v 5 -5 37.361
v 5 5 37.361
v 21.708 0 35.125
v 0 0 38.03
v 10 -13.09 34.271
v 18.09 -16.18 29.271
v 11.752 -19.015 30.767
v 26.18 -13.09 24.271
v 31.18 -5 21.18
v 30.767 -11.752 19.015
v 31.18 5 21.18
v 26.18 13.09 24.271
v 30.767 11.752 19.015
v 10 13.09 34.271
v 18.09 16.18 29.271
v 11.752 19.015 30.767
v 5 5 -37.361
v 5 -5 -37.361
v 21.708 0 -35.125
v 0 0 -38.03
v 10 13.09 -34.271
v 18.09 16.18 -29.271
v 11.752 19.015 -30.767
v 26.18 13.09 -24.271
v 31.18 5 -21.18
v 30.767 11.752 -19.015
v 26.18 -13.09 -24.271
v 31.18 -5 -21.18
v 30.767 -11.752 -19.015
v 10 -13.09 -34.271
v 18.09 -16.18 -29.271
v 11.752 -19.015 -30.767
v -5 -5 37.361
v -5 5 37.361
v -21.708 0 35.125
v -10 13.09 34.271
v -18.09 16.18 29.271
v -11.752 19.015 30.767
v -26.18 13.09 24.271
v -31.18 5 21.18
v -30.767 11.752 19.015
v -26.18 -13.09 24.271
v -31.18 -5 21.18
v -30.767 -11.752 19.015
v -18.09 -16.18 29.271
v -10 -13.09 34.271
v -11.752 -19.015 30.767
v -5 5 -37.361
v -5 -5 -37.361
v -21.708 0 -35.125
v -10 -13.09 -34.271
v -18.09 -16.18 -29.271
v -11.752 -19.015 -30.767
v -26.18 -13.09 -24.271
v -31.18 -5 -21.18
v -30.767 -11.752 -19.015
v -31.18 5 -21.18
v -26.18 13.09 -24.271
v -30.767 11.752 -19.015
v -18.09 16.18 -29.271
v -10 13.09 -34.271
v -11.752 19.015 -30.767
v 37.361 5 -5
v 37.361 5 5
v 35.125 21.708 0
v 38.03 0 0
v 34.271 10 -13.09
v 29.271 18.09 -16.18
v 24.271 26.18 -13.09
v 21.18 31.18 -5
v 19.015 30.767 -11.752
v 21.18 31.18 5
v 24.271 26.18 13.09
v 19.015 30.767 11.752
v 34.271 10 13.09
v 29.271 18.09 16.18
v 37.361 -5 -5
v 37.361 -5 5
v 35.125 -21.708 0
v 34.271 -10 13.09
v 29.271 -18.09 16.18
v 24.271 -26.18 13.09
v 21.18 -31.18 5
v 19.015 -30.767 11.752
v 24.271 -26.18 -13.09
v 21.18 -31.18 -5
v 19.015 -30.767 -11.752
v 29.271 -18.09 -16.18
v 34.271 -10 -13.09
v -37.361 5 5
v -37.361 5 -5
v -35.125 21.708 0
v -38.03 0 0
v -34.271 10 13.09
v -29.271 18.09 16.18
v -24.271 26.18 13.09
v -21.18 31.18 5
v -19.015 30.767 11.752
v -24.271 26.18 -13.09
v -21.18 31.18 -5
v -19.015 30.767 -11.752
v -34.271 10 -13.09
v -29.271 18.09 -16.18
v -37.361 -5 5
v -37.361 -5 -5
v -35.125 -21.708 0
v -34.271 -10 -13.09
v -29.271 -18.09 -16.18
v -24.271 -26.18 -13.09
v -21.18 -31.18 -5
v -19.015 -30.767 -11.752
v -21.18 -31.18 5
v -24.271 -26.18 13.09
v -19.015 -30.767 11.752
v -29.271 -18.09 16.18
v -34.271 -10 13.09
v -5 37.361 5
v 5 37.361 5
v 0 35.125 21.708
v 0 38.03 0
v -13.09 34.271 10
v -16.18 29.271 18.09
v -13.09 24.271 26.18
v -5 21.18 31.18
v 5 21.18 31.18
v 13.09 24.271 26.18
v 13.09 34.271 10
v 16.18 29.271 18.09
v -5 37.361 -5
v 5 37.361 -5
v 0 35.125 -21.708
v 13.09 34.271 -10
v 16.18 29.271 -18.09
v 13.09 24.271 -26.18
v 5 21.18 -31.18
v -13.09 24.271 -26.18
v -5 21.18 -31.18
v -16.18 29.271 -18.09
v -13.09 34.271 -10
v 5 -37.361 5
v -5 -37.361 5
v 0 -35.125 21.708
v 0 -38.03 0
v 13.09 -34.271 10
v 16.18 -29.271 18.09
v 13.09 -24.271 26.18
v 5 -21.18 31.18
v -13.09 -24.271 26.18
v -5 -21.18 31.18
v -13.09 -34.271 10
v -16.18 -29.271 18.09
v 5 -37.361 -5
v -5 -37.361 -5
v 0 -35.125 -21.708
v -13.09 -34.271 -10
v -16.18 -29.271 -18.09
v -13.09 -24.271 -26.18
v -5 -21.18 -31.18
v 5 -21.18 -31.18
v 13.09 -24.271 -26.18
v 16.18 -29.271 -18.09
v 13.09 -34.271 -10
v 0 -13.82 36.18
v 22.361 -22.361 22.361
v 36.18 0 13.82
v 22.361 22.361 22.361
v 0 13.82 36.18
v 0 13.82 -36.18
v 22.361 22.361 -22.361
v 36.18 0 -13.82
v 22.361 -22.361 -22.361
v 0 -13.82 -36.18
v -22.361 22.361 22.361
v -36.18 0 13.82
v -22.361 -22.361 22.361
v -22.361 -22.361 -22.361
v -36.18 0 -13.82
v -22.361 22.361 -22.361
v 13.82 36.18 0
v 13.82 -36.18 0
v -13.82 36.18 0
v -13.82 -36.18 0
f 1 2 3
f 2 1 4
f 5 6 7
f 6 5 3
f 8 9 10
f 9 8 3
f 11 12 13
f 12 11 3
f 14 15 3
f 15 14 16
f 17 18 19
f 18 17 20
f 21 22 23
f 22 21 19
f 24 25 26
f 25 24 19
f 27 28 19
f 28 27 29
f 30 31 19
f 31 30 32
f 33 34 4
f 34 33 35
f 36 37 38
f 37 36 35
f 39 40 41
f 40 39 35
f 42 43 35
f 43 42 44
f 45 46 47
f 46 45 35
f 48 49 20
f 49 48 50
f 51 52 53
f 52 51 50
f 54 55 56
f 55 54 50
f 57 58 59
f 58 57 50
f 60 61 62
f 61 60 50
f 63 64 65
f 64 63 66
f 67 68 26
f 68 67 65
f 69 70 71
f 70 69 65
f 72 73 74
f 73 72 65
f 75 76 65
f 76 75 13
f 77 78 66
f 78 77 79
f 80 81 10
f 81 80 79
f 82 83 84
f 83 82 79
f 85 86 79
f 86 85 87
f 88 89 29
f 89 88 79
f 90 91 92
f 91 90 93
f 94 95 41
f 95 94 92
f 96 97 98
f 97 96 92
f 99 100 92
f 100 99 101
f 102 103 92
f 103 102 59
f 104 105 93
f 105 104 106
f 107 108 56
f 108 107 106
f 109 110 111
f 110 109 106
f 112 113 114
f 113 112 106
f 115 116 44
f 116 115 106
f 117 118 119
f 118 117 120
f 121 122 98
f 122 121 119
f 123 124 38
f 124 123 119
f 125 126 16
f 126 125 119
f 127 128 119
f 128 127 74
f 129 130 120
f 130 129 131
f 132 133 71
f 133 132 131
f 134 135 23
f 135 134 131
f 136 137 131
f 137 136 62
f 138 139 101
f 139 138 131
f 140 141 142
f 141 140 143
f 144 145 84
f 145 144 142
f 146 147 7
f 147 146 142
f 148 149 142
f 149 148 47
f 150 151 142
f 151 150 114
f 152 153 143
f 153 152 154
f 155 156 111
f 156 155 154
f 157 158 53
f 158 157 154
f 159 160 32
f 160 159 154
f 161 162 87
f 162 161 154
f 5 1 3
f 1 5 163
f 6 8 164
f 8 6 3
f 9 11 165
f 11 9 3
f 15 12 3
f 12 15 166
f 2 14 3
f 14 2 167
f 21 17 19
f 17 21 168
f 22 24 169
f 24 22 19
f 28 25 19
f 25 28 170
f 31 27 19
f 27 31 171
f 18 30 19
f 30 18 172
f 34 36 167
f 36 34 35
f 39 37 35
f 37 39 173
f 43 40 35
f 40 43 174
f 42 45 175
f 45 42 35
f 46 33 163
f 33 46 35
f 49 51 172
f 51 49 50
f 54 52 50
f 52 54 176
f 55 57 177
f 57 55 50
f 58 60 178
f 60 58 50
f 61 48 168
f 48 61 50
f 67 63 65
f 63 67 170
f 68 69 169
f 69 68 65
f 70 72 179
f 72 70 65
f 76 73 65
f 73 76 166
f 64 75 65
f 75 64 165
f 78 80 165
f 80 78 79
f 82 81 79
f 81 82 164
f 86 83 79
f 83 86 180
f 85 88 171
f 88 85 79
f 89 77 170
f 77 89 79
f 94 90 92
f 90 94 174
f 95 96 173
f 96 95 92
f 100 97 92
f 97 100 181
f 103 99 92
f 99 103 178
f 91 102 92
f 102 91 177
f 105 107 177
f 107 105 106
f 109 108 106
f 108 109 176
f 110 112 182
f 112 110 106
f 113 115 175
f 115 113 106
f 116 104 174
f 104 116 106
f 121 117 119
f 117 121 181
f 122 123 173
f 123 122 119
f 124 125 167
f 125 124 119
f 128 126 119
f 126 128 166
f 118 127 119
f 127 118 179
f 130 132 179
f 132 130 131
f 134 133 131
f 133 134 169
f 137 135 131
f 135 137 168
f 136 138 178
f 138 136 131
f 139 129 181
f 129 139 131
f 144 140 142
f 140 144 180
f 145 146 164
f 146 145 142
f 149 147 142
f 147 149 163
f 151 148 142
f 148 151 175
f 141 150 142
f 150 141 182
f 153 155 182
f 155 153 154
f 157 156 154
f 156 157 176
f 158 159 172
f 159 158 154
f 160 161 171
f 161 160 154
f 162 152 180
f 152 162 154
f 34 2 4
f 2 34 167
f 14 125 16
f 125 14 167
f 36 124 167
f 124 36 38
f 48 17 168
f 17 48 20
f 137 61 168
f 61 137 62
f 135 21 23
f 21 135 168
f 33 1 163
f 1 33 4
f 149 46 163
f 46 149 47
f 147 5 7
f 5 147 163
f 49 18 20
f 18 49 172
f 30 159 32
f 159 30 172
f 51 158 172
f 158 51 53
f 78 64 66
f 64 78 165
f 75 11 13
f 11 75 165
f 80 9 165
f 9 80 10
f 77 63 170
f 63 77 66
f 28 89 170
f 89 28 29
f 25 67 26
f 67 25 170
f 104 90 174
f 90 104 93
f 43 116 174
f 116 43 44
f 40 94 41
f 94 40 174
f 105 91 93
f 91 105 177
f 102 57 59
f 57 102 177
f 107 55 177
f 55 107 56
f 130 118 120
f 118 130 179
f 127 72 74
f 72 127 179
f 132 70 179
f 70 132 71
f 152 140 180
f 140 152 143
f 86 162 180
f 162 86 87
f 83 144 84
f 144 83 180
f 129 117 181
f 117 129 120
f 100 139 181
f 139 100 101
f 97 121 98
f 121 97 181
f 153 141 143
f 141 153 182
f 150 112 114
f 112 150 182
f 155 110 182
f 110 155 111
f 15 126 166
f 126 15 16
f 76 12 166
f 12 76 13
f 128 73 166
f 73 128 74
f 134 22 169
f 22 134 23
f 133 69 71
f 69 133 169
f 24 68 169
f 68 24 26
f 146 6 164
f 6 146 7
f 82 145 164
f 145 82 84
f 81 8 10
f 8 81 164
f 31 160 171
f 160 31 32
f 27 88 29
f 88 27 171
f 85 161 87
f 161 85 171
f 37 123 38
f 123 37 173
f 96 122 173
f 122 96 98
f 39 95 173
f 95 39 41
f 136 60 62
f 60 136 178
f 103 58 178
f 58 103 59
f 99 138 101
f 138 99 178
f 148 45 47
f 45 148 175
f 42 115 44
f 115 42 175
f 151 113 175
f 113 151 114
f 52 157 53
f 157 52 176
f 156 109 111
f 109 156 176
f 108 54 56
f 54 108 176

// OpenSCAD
// Joined Truncated Icosidodecahedron
//   coords via: http://dmccooey.com/polyhedra/JoinedTruncatedIcosidodecahedron.html
//   180 sides
//   182 vertices
//   360 edges
//
scaling_factor = 10;

C0  = 3 * (15 +     sqrt(5)) / 44;
C1  =     ( 3 +     sqrt(5)) /  4;
C2  =     ( 5 -     sqrt(5)) /  2;
C3  =     ( 1 +     sqrt(5)) /  2;
C4  =     ( 5 +     sqrt(5)) /  4;
C5  = 3 * ( 5 + 4 * sqrt(5)) / 22;
C6  =     ( 2 +     sqrt(5)) /  2;
C7  = 3 * ( 5 +     sqrt(5)) / 10;
C8  =               sqrt(5);
C9  = 3 * ( 1 +     sqrt(5)) /  4;
C10 =     ( 3 +     sqrt(5)) /  2;
C11 =     ( 5 + 3 * sqrt(5)) /  4;
C12 = 3 * (25 + 9 * sqrt(5)) / 44;
C13 =     ( 4 +     sqrt(5)) /  2;
C14 =     ( 7 + 3 * sqrt(5)) /  4;
C15 = 3 * ( 5 + 3 * sqrt(5)) / 10;
C16 =     ( 5 +     sqrt(5)) /  2;
C17 =     ( 3 + 2 * sqrt(5)) /  2;
C18 = 3 * ( 5 + 4 * sqrt(5)) / 11;

vertices = [
 [ 0.0,  0.0,  C18], [ 0.0,  0.0, -C18],
 [ C18,  0.0,  0.0], [-C18,  0.0,  0.0],
 [ 0.0,  C18,  0.0], [ 0.0, -C18,  0.0],
 [ 0.5,  0.5,  C17], [ 0.5,  0.5, -C17], [ 0.5, -0.5,  C17], [ 0.5, -0.5, -C17],
 [-0.5,  0.5,  C17], [-0.5,  0.5, -C17], [-0.5, -0.5,  C17], [-0.5, -0.5, -C17],
 [ C17,  0.5,  0.5], [ C17,  0.5, -0.5], [ C17, -0.5,  0.5], [ C17, -0.5, -0.5],
 [-C17,  0.5,  0.5], [-C17,  0.5, -0.5], [-C17, -0.5,  0.5], [-C17, -0.5, -0.5],
 [ 0.5,  C17,  0.5], [ 0.5,  C17, -0.5], [ 0.5, -C17,  0.5], [ 0.5, -C17, -0.5],
 [-0.5,  C17,  0.5], [-0.5,  C17, -0.5], [-0.5, -C17,  0.5], [-0.5, -C17, -0.5],
 [ 0.0,   C2,  C16], [ 0.0,   C2, -C16], [ 0.0,  -C2,  C16], [ 0.0,  -C2, -C16],
 [ C16,  0.0,   C2], [ C16,  0.0,  -C2], [-C16,  0.0,   C2], [-C16,  0.0,  -C2],
 [  C2,  C16,  0.0], [  C2, -C16,  0.0], [ -C2,  C16,  0.0], [ -C2, -C16,  0.0],
 [  C7,  0.0,  C15], [  C7,  0.0, -C15], [ -C7,  0.0,  C15], [ -C7,  0.0, -C15],
 [ C15,   C7,  0.0], [ C15,  -C7,  0.0], [-C15,   C7,  0.0], [-C15,  -C7,  0.0],
 [ 0.0,  C15,   C7], [ 0.0,  C15,  -C7], [ 0.0, -C15,   C7], [ 0.0, -C15,  -C7],
 [ 1.0,   C1,  C14], [ 1.0,   C1, -C14], [ 1.0,  -C1,  C14], [ 1.0,  -C1, -C14],
 [-1.0,   C1,  C14], [-1.0,   C1, -C14], [-1.0,  -C1,  C14], [-1.0,  -C1, -C14],
 [ C14,  1.0,   C1], [ C14,  1.0,  -C1], [ C14, -1.0,   C1], [ C14, -1.0,  -C1],
 [-C14,  1.0,   C1], [-C14,  1.0,  -C1], [-C14, -1.0,   C1], [-C14, -1.0,  -C1],
 [  C1,  C14,  1.0], [  C1,  C14, -1.0], [  C1, -C14,  1.0], [  C1, -C14, -1.0],
 [ -C1,  C14,  1.0], [ -C1,  C14, -1.0], [ -C1, -C14,  1.0], [ -C1, -C14, -1.0],
 [ 0.5,   C6,  C13], [ 0.5,   C6, -C13], [ 0.5,  -C6,  C13], [ 0.5,  -C6, -C13],
 [-0.5,   C6,  C13], [-0.5,   C6, -C13], [-0.5,  -C6,  C13], [-0.5,  -C6, -C13],
 [ C13,  0.5,   C6], [ C13,  0.5,  -C6], [ C13, -0.5,   C6], [ C13, -0.5,  -C6],
 [-C13,  0.5,   C6], [-C13,  0.5,  -C6], [-C13, -0.5,   C6], [-C13, -0.5,  -C6],
 [  C6,  C13,  0.5], [  C6,  C13, -0.5], [  C6, -C13,  0.5], [  C6, -C13, -0.5],
 [ -C6,  C13,  0.5], [ -C6,  C13, -0.5], [ -C6, -C13,  0.5], [ -C6, -C13, -0.5],
 [  C0,   C5,  C12], [  C0,   C5, -C12], [  C0,  -C5,  C12], [  C0,  -C5, -C12],
 [ -C0,   C5,  C12], [ -C0,   C5, -C12], [ -C0,  -C5,  C12], [ -C0,  -C5, -C12],
 [ C12,   C0,   C5], [ C12,   C0,  -C5], [ C12,  -C0,   C5], [ C12,  -C0,  -C5],
 [-C12,   C0,   C5], [-C12,   C0,  -C5], [-C12,  -C0,   C5], [-C12,  -C0,  -C5],
 [  C5,  C12,   C0], [  C5,  C12,  -C0], [  C5, -C12,   C0], [  C5, -C12,  -C0],
 [ -C5,  C12,   C0], [ -C5,  C12,  -C0], [ -C5, -C12,   C0], [ -C5, -C12,  -C0],
 [  C4,   C3,  C11], [  C4,   C3, -C11], [  C4,  -C3,  C11], [  C4,  -C3, -C11],
 [ -C4,   C3,  C11], [ -C4,   C3, -C11], [ -C4,  -C3,  C11], [ -C4,  -C3, -C11],
 [ C11,   C4,   C3], [ C11,   C4,  -C3], [ C11,  -C4,   C3], [ C11,  -C4,  -C3],
 [-C11,   C4,   C3], [-C11,   C4,  -C3], [-C11,  -C4,   C3], [-C11,  -C4,  -C3],
 [  C3,  C11,   C4], [  C3,  C11,  -C4], [  C3, -C11,   C4], [  C3, -C11,  -C4],
 [ -C3,  C11,   C4], [ -C3,  C11,  -C4], [ -C3, -C11,   C4], [ -C3, -C11,  -C4],
 [  C1,   C9,  C10], [  C1,   C9, -C10], [  C1,  -C9,  C10], [  C1,  -C9, -C10],
 [ -C1,   C9,  C10], [ -C1,   C9, -C10], [ -C1,  -C9,  C10], [ -C1,  -C9, -C10],
 [ C10,   C1,   C9], [ C10,   C1,  -C9], [ C10,  -C1,   C9], [ C10,  -C1,  -C9],
 [-C10,   C1,   C9], [-C10,   C1,  -C9], [-C10,  -C1,   C9], [-C10,  -C1,  -C9],
 [  C9,  C10,   C1], [  C9,  C10,  -C1], [  C9, -C10,   C1], [  C9, -C10,  -C1],
 [ -C9,  C10,   C1], [ -C9,  C10,  -C1], [ -C9, -C10,   C1], [ -C9, -C10,  -C1],
 [  C8,   C8,   C8], [  C8,   C8,  -C8], [  C8,  -C8,   C8], [  C8,  -C8,  -C8],
 [ -C8,   C8,   C8], [ -C8,   C8,  -C8], [ -C8,  -C8,   C8], [ -C8,  -C8,  -C8]
];

faces = [
  [ 42,   6,   0,   8], [ 42,  56, 104, 128], [ 42, 160, 112,  88], 
  [ 42,  86, 110, 158], [ 42, 126, 102,  54], 
  [ 43,   9,   1,   7], [ 43,  55, 103, 127], [ 43, 159, 111,  87], 
  [ 43,  89, 113, 161], [ 43, 129, 105,  57],
  [ 44,  12,   0,  10], [ 44,  58, 106, 130], [ 44, 162, 114,  90], 
  [ 44,  92, 116, 164], [ 44, 132, 108,  60], 
  [ 45,  11,   1,  13], [ 45,  61, 109, 133], [ 45, 165, 117,  93], 
  [ 45,  91, 115, 163], [ 45, 131, 107,  59],
  [ 46,  14,   2,  15], [ 46,  63, 111, 135], [ 46, 167, 119,  95], 
  [ 46,  94, 118, 166], [ 46, 134, 110,  62], 
  [ 47,  17,   2,  16], [ 47,  64, 112, 136], [ 47, 168, 120,  96], 
  [ 47,  97, 121, 169], [ 47, 137, 113,  65], 
  [ 48,  19,   3,  18], [ 48,  66, 114, 138], [ 48, 170, 122,  98], 
  [ 48,  99, 123, 171], [ 48, 139, 115,  67], 
  [ 49,  20,   3,  21], [ 49,  69, 117, 141], [ 49, 173, 125, 101], 
  [ 49, 100, 124, 172], [ 49, 140, 116,  68], 
  [ 50,  22,   4,  26], [ 50,  74, 122, 146], [ 50, 154, 106,  82], 
  [ 50,  78, 102, 150], [ 50, 142, 118,  70], 
  [ 51,  27,   4,  23], [ 51,  71, 119, 143], [ 51, 151, 103,  79], 
  [ 51,  83, 107, 155], [ 51, 147, 123,  75], 
  [ 52,  28,   5,  24], [ 52,  72, 120, 144], [ 52, 152, 104,  80], 
  [ 52,  84, 108, 156], [ 52, 148, 124,  76],
  [ 53,  25,   5,  29], [ 53,  77, 125, 149], [ 53, 157, 109,  85], 
  [ 53,  81, 105, 153], [ 53, 145, 121,  73], 
  [ 42,   8,  32,  56], [ 42, 128, 176, 160], [ 42,  88,  34,  86], 
  [ 42, 158, 174, 126], [ 42,  54,  30,   6], 
  [ 43,   7,  31,  55], [ 43, 127, 175, 159], [ 43,  87,  35,  89], 
  [ 43, 161, 177, 129], [ 43,  57,  33,   9], 
  [ 44,  10,  30,  58], [ 44, 130, 178, 162], [ 44,  90,  36,  92], 
  [ 44, 164, 180, 132], [ 44,  60,  32,  12], 
  [ 45,  13,  33,  61], [ 45, 133, 181, 165], [ 45,  93,  37,  91], 
  [ 45, 163, 179, 131], [ 45,  59,  31,  11], 
  [ 46,  15,  35,  63], [ 46, 135, 175, 167], [ 46,  95,  38,  94], 
  [ 46, 166, 174, 134], [ 46,  62,  34,  14], 
  [ 47,  16,  34,  64], [ 47, 136, 176, 168], [ 47,  96,  39,  97], 
  [ 47, 169, 177, 137], [ 47,  65,  35,  17], 
  [ 48,  18,  36,  66], [ 48, 138, 178, 170], [ 48,  98,  40,  99], 
  [ 48, 171, 179, 139], [ 48,  67,  37,  19], 
  [ 49,  21,  37,  69], [ 49, 141, 181, 173], [ 49, 101,  41, 100], 
  [ 49, 172, 180, 140], [ 49,  68,  36,  20], 
  [ 50,  26,  40,  74], [ 50, 146, 178, 154], [ 50,  82,  30,  78], 
  [ 50, 150, 174, 142], [ 50,  70,  38,  22], 
  [ 51,  23,  38,  71], [ 51, 143, 175, 151], [ 51,  79,  31,  83], 
  [ 51, 155, 179, 147], [ 51,  75,  40,  27], 
  [ 52,  24,  39,  72], [ 52, 144, 176, 152], [ 52,  80,  32,  84], 
  [ 52, 156, 180, 148], [ 52,  76,  41,  28], 
  [ 53,  29,  41,  77], [ 53, 149, 181, 157], [ 53,  85,  33,  81], 
  [ 53, 153, 177, 145], [ 53,  73,  39,  25], 
  [ 30,  10,   0,   6], [ 30,  54, 102,  78], [ 30,  82, 106,  58], 
  [ 31,   7,   1,  11], [ 31,  59, 107,  83], [ 31,  79, 103,  55], 
  [ 32,   8,   0,  12], [ 32,  60, 108,  84], [ 32,  80, 104,  56], 
  [ 33,  13,   1,   9], [ 33,  57, 105,  81], [ 33,  85, 109,  61], 
  [ 34,  16,   2,  14], [ 34,  62, 110,  86], [ 34,  88, 112,  64], 
  [ 35,  15,   2,  17], [ 35,  65, 113,  89], [ 35,  87, 111,  63], 
  [ 36,  18,   3,  20], [ 36,  68, 116,  92], [ 36,  90, 114,  66], 
  [ 37,  21,   3,  19], [ 37,  67, 115,  91], [ 37,  93, 117,  69], 
  [ 38,  23,   4,  22], [ 38,  70, 118,  94], [ 38,  95, 119,  71], 
  [ 39,  24,   5,  25], [ 39,  73, 121,  97], [ 39,  96, 120,  72], 
  [ 40,  26,   4,  27], [ 40,  75, 123,  99], [ 40,  98, 122,  74], 
  [ 41,  29,   5,  28], [ 41,  76, 124, 100], [ 41, 101, 125,  77], 
  [174, 150, 102, 126], [174, 158, 110, 134], [174, 166, 118, 142], 
  [175, 127, 103, 151], [175, 143, 119, 167], [175, 135, 111, 159], 
  [176, 128, 104, 152], [176, 144, 120, 168], [176, 136, 112, 160], 
  [177, 153, 105, 129], [177, 161, 113, 137], [177, 169, 121, 145], 
  [178, 130, 106, 154], [178, 146, 122, 170], [178, 138, 114, 162], 
  [179, 155, 107, 131], [179, 163, 115, 139], [179, 171, 123, 147], 
  [180, 156, 108, 132], [180, 164, 116, 140], [180, 172, 124, 148], 
  [181, 133, 109, 157], [181, 149, 125, 173], [181, 141, 117, 165]
];

scale(scaling_factor) {
  polyhedron(points=vertices, faces=faces, convexity=20);
};
